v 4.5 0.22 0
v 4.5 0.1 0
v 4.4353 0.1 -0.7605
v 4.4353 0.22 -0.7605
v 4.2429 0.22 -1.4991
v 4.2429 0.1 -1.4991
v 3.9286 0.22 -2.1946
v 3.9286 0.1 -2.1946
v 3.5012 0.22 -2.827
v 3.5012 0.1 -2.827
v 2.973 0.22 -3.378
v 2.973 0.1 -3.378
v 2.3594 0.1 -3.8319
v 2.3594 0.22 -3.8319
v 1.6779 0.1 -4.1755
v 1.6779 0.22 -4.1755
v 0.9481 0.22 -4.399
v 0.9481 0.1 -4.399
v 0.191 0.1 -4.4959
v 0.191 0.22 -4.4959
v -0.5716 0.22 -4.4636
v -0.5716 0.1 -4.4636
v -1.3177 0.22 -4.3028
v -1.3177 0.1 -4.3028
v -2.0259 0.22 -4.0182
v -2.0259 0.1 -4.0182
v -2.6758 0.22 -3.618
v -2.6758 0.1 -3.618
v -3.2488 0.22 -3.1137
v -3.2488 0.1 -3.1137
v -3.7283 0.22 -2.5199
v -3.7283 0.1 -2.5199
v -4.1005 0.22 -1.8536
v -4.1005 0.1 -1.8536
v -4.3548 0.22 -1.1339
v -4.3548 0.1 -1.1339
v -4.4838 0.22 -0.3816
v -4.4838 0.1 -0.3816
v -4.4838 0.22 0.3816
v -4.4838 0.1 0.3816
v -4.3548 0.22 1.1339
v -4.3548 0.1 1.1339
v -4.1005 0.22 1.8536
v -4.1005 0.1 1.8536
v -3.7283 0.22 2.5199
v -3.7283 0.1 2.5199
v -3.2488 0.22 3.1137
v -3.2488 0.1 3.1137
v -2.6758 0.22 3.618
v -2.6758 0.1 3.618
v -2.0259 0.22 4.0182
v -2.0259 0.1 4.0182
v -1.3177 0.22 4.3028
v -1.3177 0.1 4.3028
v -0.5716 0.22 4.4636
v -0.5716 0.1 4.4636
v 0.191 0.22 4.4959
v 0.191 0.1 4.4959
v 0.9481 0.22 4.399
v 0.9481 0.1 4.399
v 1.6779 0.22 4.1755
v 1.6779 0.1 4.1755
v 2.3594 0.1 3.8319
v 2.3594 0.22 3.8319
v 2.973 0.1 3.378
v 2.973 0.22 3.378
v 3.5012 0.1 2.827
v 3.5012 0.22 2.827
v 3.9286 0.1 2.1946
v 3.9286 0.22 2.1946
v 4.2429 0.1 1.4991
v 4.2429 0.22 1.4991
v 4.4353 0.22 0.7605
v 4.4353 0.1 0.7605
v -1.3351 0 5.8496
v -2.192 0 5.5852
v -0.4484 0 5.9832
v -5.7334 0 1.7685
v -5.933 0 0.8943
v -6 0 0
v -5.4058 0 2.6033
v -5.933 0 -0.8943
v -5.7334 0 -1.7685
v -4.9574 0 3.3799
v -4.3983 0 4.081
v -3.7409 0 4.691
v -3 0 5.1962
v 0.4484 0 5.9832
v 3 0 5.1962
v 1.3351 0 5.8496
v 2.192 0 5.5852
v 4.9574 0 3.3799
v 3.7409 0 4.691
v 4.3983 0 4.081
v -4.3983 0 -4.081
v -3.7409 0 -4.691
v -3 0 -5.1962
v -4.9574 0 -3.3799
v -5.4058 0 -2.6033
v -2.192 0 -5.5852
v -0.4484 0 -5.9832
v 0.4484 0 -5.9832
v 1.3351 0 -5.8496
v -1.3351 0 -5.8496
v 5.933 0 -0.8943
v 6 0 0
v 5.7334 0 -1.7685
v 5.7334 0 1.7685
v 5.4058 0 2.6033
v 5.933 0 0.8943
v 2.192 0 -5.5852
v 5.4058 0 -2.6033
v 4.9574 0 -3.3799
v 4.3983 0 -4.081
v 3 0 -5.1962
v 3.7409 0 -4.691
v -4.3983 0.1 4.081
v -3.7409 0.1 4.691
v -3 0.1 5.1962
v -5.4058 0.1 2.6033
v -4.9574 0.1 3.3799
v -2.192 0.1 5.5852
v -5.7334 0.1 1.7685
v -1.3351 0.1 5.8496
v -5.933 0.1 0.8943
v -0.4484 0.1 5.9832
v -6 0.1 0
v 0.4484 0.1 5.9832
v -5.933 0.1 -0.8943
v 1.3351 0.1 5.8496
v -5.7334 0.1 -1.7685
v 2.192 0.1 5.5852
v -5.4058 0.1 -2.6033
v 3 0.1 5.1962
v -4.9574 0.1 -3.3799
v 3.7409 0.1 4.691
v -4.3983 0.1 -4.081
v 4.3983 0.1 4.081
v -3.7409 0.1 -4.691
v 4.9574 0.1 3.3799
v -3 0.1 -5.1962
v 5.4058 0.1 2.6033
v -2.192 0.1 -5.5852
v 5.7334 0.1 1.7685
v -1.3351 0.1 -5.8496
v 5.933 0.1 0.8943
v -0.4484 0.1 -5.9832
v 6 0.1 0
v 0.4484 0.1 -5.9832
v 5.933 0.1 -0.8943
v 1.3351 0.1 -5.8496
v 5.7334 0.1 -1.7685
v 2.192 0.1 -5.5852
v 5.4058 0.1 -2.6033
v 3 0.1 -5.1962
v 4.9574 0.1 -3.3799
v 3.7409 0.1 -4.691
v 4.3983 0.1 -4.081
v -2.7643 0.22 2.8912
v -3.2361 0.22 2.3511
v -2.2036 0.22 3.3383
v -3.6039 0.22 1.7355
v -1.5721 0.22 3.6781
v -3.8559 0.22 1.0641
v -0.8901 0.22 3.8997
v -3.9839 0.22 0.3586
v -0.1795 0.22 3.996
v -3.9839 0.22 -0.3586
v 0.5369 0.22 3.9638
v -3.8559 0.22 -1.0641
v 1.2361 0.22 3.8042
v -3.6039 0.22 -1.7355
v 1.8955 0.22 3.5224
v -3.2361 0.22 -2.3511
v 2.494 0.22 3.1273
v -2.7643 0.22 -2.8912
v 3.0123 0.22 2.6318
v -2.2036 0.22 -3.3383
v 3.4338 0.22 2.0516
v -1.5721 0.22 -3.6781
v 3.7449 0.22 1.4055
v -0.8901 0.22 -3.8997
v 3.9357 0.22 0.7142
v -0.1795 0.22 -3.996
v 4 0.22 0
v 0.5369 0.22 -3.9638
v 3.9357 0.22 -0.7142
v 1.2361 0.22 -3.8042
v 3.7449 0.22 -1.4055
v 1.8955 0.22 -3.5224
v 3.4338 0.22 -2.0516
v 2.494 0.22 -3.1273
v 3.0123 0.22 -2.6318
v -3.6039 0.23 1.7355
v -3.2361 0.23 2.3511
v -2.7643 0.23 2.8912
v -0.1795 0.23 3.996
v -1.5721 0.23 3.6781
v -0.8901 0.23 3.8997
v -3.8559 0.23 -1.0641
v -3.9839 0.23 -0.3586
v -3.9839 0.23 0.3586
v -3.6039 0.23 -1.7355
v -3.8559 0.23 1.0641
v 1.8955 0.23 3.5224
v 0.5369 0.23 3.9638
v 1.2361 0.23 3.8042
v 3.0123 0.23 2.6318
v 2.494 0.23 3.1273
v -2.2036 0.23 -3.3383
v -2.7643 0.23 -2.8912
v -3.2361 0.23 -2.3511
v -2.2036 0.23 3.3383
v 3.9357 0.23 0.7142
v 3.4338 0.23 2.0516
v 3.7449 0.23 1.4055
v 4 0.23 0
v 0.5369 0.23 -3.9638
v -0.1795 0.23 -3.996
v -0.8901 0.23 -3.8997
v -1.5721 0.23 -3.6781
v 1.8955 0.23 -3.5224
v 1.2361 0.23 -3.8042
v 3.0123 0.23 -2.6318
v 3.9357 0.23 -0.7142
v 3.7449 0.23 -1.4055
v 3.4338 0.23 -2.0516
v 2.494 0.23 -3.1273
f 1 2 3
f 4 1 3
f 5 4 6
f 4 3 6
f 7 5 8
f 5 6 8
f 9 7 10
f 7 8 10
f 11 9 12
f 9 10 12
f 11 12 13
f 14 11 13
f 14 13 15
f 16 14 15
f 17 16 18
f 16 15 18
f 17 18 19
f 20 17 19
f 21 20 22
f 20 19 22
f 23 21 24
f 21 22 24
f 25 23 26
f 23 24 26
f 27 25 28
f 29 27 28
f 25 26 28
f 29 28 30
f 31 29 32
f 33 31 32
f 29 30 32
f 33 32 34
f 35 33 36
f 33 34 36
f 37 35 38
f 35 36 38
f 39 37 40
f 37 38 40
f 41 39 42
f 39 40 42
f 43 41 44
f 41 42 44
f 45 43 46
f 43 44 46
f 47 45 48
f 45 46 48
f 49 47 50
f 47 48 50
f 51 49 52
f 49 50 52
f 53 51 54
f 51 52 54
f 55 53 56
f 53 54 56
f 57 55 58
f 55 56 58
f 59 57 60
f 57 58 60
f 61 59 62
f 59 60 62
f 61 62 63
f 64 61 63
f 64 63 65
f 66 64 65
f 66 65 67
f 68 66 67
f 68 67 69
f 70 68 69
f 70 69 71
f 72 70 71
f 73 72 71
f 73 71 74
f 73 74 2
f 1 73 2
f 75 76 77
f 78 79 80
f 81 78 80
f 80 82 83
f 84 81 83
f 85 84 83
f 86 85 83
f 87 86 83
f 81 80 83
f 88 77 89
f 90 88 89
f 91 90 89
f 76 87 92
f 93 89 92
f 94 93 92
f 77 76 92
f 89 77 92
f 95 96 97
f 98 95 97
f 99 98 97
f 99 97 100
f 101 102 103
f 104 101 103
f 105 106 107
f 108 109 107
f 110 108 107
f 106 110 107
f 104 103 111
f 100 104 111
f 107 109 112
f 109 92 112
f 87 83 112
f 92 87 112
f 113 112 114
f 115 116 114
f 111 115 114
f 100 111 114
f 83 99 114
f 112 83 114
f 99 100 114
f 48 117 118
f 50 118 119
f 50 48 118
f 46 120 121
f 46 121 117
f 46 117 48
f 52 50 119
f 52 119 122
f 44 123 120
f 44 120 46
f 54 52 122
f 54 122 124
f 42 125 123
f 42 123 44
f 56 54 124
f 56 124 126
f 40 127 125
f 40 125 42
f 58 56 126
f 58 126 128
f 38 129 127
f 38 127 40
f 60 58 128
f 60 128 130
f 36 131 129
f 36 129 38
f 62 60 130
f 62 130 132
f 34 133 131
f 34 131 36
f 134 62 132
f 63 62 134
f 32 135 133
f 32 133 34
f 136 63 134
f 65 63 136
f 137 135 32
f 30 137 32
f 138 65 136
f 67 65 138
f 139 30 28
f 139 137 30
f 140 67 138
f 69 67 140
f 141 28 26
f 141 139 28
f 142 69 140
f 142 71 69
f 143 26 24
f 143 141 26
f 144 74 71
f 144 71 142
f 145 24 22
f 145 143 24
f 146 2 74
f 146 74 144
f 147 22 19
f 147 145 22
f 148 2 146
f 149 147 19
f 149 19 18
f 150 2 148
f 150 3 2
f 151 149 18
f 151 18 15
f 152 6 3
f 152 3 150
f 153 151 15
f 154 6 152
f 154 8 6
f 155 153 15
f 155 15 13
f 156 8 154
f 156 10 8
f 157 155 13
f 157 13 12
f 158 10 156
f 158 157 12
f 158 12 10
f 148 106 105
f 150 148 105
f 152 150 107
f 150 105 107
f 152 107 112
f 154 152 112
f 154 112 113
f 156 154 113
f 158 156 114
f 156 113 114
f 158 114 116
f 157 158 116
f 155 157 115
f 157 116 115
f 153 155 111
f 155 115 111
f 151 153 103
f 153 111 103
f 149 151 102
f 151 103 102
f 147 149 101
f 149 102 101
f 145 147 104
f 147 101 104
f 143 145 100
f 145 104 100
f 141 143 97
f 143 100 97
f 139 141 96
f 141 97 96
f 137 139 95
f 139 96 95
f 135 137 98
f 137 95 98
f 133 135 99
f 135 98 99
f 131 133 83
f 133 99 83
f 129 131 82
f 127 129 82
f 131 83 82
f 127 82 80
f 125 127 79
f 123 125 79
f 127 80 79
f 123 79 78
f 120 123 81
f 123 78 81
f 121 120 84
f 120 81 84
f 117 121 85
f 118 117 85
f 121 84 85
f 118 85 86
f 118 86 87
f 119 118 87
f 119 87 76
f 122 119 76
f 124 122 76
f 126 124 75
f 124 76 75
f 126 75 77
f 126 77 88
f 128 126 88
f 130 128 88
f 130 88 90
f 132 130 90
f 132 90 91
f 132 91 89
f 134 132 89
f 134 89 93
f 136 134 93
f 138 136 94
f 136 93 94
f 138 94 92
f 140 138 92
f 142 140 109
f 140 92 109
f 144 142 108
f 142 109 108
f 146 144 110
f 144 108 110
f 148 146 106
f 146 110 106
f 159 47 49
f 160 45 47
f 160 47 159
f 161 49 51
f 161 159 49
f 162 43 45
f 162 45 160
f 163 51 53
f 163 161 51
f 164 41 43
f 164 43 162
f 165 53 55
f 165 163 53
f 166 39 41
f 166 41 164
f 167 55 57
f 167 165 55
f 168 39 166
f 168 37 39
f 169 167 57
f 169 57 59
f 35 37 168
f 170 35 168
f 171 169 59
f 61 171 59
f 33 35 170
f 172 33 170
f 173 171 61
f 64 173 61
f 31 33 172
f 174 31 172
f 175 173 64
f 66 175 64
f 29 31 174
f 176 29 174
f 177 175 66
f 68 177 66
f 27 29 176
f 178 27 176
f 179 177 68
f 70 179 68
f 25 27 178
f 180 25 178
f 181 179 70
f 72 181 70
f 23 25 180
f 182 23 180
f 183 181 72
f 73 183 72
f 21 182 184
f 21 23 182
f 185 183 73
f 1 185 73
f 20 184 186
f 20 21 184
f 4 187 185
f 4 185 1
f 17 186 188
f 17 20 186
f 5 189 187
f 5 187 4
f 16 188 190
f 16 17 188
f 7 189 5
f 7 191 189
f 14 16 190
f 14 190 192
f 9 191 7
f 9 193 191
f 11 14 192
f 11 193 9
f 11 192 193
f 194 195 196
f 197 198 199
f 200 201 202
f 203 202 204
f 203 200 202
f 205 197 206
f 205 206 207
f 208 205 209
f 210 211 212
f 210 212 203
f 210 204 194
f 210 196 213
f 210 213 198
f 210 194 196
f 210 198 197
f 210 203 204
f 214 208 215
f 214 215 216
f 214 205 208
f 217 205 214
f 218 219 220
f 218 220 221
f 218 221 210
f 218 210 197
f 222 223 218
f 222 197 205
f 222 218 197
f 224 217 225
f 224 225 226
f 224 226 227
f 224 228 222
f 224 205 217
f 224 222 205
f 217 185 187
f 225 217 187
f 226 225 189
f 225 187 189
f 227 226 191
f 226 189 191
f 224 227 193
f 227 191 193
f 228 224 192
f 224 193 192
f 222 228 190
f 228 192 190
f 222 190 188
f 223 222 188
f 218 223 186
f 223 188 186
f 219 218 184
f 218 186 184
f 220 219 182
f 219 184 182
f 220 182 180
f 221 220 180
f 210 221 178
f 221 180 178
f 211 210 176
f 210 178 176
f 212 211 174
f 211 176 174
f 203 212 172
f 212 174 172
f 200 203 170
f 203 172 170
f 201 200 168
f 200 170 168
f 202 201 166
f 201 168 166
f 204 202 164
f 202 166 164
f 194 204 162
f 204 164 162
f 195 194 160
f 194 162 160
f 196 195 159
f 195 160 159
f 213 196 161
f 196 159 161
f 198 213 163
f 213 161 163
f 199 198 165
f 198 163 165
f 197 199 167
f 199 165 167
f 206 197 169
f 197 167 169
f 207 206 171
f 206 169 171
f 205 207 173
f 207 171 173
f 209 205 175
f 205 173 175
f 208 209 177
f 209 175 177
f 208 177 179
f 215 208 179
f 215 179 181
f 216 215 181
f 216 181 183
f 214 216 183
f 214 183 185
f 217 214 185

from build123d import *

# Parameters (mm, degrees)
SKETCH_1_R      = 6
EXTRUDE_1_DEPTH = 0.1
SKETCH_2_R      = 4.5
EXTRUDE_2_DEPTH = 0.12
SKETCH_3_R      = 4
EXTRUDE_3_DEPTH = 0.01


with BuildPart() as part:
    # 草图1 → 凸台-拉伸1 (new body)
    with BuildSketch(Plane(origin=(0, 0, 0), x_dir=(1, 0, 0), z_dir=(0, 1, 0))):
        Circle(SKETCH_1_R)
    extrude(amount=EXTRUDE_1_DEPTH)

    # 草图2 → 凸台-拉伸2 (add)
    with BuildSketch(Plane(origin=(0, 0.1, 0), x_dir=(1, 0, 0), z_dir=(0, 1, 0))):
        Circle(SKETCH_2_R)
    extrude(amount=EXTRUDE_2_DEPTH)

    # 草图3 → 凸台-拉伸3 (add)
    with BuildSketch(Plane(origin=(0, 0.22, 0), x_dir=(1, 0, 0), z_dir=(0, 1, 0))):
        Circle(SKETCH_3_R)
    extrude(amount=EXTRUDE_3_DEPTH)


solid = part.part
